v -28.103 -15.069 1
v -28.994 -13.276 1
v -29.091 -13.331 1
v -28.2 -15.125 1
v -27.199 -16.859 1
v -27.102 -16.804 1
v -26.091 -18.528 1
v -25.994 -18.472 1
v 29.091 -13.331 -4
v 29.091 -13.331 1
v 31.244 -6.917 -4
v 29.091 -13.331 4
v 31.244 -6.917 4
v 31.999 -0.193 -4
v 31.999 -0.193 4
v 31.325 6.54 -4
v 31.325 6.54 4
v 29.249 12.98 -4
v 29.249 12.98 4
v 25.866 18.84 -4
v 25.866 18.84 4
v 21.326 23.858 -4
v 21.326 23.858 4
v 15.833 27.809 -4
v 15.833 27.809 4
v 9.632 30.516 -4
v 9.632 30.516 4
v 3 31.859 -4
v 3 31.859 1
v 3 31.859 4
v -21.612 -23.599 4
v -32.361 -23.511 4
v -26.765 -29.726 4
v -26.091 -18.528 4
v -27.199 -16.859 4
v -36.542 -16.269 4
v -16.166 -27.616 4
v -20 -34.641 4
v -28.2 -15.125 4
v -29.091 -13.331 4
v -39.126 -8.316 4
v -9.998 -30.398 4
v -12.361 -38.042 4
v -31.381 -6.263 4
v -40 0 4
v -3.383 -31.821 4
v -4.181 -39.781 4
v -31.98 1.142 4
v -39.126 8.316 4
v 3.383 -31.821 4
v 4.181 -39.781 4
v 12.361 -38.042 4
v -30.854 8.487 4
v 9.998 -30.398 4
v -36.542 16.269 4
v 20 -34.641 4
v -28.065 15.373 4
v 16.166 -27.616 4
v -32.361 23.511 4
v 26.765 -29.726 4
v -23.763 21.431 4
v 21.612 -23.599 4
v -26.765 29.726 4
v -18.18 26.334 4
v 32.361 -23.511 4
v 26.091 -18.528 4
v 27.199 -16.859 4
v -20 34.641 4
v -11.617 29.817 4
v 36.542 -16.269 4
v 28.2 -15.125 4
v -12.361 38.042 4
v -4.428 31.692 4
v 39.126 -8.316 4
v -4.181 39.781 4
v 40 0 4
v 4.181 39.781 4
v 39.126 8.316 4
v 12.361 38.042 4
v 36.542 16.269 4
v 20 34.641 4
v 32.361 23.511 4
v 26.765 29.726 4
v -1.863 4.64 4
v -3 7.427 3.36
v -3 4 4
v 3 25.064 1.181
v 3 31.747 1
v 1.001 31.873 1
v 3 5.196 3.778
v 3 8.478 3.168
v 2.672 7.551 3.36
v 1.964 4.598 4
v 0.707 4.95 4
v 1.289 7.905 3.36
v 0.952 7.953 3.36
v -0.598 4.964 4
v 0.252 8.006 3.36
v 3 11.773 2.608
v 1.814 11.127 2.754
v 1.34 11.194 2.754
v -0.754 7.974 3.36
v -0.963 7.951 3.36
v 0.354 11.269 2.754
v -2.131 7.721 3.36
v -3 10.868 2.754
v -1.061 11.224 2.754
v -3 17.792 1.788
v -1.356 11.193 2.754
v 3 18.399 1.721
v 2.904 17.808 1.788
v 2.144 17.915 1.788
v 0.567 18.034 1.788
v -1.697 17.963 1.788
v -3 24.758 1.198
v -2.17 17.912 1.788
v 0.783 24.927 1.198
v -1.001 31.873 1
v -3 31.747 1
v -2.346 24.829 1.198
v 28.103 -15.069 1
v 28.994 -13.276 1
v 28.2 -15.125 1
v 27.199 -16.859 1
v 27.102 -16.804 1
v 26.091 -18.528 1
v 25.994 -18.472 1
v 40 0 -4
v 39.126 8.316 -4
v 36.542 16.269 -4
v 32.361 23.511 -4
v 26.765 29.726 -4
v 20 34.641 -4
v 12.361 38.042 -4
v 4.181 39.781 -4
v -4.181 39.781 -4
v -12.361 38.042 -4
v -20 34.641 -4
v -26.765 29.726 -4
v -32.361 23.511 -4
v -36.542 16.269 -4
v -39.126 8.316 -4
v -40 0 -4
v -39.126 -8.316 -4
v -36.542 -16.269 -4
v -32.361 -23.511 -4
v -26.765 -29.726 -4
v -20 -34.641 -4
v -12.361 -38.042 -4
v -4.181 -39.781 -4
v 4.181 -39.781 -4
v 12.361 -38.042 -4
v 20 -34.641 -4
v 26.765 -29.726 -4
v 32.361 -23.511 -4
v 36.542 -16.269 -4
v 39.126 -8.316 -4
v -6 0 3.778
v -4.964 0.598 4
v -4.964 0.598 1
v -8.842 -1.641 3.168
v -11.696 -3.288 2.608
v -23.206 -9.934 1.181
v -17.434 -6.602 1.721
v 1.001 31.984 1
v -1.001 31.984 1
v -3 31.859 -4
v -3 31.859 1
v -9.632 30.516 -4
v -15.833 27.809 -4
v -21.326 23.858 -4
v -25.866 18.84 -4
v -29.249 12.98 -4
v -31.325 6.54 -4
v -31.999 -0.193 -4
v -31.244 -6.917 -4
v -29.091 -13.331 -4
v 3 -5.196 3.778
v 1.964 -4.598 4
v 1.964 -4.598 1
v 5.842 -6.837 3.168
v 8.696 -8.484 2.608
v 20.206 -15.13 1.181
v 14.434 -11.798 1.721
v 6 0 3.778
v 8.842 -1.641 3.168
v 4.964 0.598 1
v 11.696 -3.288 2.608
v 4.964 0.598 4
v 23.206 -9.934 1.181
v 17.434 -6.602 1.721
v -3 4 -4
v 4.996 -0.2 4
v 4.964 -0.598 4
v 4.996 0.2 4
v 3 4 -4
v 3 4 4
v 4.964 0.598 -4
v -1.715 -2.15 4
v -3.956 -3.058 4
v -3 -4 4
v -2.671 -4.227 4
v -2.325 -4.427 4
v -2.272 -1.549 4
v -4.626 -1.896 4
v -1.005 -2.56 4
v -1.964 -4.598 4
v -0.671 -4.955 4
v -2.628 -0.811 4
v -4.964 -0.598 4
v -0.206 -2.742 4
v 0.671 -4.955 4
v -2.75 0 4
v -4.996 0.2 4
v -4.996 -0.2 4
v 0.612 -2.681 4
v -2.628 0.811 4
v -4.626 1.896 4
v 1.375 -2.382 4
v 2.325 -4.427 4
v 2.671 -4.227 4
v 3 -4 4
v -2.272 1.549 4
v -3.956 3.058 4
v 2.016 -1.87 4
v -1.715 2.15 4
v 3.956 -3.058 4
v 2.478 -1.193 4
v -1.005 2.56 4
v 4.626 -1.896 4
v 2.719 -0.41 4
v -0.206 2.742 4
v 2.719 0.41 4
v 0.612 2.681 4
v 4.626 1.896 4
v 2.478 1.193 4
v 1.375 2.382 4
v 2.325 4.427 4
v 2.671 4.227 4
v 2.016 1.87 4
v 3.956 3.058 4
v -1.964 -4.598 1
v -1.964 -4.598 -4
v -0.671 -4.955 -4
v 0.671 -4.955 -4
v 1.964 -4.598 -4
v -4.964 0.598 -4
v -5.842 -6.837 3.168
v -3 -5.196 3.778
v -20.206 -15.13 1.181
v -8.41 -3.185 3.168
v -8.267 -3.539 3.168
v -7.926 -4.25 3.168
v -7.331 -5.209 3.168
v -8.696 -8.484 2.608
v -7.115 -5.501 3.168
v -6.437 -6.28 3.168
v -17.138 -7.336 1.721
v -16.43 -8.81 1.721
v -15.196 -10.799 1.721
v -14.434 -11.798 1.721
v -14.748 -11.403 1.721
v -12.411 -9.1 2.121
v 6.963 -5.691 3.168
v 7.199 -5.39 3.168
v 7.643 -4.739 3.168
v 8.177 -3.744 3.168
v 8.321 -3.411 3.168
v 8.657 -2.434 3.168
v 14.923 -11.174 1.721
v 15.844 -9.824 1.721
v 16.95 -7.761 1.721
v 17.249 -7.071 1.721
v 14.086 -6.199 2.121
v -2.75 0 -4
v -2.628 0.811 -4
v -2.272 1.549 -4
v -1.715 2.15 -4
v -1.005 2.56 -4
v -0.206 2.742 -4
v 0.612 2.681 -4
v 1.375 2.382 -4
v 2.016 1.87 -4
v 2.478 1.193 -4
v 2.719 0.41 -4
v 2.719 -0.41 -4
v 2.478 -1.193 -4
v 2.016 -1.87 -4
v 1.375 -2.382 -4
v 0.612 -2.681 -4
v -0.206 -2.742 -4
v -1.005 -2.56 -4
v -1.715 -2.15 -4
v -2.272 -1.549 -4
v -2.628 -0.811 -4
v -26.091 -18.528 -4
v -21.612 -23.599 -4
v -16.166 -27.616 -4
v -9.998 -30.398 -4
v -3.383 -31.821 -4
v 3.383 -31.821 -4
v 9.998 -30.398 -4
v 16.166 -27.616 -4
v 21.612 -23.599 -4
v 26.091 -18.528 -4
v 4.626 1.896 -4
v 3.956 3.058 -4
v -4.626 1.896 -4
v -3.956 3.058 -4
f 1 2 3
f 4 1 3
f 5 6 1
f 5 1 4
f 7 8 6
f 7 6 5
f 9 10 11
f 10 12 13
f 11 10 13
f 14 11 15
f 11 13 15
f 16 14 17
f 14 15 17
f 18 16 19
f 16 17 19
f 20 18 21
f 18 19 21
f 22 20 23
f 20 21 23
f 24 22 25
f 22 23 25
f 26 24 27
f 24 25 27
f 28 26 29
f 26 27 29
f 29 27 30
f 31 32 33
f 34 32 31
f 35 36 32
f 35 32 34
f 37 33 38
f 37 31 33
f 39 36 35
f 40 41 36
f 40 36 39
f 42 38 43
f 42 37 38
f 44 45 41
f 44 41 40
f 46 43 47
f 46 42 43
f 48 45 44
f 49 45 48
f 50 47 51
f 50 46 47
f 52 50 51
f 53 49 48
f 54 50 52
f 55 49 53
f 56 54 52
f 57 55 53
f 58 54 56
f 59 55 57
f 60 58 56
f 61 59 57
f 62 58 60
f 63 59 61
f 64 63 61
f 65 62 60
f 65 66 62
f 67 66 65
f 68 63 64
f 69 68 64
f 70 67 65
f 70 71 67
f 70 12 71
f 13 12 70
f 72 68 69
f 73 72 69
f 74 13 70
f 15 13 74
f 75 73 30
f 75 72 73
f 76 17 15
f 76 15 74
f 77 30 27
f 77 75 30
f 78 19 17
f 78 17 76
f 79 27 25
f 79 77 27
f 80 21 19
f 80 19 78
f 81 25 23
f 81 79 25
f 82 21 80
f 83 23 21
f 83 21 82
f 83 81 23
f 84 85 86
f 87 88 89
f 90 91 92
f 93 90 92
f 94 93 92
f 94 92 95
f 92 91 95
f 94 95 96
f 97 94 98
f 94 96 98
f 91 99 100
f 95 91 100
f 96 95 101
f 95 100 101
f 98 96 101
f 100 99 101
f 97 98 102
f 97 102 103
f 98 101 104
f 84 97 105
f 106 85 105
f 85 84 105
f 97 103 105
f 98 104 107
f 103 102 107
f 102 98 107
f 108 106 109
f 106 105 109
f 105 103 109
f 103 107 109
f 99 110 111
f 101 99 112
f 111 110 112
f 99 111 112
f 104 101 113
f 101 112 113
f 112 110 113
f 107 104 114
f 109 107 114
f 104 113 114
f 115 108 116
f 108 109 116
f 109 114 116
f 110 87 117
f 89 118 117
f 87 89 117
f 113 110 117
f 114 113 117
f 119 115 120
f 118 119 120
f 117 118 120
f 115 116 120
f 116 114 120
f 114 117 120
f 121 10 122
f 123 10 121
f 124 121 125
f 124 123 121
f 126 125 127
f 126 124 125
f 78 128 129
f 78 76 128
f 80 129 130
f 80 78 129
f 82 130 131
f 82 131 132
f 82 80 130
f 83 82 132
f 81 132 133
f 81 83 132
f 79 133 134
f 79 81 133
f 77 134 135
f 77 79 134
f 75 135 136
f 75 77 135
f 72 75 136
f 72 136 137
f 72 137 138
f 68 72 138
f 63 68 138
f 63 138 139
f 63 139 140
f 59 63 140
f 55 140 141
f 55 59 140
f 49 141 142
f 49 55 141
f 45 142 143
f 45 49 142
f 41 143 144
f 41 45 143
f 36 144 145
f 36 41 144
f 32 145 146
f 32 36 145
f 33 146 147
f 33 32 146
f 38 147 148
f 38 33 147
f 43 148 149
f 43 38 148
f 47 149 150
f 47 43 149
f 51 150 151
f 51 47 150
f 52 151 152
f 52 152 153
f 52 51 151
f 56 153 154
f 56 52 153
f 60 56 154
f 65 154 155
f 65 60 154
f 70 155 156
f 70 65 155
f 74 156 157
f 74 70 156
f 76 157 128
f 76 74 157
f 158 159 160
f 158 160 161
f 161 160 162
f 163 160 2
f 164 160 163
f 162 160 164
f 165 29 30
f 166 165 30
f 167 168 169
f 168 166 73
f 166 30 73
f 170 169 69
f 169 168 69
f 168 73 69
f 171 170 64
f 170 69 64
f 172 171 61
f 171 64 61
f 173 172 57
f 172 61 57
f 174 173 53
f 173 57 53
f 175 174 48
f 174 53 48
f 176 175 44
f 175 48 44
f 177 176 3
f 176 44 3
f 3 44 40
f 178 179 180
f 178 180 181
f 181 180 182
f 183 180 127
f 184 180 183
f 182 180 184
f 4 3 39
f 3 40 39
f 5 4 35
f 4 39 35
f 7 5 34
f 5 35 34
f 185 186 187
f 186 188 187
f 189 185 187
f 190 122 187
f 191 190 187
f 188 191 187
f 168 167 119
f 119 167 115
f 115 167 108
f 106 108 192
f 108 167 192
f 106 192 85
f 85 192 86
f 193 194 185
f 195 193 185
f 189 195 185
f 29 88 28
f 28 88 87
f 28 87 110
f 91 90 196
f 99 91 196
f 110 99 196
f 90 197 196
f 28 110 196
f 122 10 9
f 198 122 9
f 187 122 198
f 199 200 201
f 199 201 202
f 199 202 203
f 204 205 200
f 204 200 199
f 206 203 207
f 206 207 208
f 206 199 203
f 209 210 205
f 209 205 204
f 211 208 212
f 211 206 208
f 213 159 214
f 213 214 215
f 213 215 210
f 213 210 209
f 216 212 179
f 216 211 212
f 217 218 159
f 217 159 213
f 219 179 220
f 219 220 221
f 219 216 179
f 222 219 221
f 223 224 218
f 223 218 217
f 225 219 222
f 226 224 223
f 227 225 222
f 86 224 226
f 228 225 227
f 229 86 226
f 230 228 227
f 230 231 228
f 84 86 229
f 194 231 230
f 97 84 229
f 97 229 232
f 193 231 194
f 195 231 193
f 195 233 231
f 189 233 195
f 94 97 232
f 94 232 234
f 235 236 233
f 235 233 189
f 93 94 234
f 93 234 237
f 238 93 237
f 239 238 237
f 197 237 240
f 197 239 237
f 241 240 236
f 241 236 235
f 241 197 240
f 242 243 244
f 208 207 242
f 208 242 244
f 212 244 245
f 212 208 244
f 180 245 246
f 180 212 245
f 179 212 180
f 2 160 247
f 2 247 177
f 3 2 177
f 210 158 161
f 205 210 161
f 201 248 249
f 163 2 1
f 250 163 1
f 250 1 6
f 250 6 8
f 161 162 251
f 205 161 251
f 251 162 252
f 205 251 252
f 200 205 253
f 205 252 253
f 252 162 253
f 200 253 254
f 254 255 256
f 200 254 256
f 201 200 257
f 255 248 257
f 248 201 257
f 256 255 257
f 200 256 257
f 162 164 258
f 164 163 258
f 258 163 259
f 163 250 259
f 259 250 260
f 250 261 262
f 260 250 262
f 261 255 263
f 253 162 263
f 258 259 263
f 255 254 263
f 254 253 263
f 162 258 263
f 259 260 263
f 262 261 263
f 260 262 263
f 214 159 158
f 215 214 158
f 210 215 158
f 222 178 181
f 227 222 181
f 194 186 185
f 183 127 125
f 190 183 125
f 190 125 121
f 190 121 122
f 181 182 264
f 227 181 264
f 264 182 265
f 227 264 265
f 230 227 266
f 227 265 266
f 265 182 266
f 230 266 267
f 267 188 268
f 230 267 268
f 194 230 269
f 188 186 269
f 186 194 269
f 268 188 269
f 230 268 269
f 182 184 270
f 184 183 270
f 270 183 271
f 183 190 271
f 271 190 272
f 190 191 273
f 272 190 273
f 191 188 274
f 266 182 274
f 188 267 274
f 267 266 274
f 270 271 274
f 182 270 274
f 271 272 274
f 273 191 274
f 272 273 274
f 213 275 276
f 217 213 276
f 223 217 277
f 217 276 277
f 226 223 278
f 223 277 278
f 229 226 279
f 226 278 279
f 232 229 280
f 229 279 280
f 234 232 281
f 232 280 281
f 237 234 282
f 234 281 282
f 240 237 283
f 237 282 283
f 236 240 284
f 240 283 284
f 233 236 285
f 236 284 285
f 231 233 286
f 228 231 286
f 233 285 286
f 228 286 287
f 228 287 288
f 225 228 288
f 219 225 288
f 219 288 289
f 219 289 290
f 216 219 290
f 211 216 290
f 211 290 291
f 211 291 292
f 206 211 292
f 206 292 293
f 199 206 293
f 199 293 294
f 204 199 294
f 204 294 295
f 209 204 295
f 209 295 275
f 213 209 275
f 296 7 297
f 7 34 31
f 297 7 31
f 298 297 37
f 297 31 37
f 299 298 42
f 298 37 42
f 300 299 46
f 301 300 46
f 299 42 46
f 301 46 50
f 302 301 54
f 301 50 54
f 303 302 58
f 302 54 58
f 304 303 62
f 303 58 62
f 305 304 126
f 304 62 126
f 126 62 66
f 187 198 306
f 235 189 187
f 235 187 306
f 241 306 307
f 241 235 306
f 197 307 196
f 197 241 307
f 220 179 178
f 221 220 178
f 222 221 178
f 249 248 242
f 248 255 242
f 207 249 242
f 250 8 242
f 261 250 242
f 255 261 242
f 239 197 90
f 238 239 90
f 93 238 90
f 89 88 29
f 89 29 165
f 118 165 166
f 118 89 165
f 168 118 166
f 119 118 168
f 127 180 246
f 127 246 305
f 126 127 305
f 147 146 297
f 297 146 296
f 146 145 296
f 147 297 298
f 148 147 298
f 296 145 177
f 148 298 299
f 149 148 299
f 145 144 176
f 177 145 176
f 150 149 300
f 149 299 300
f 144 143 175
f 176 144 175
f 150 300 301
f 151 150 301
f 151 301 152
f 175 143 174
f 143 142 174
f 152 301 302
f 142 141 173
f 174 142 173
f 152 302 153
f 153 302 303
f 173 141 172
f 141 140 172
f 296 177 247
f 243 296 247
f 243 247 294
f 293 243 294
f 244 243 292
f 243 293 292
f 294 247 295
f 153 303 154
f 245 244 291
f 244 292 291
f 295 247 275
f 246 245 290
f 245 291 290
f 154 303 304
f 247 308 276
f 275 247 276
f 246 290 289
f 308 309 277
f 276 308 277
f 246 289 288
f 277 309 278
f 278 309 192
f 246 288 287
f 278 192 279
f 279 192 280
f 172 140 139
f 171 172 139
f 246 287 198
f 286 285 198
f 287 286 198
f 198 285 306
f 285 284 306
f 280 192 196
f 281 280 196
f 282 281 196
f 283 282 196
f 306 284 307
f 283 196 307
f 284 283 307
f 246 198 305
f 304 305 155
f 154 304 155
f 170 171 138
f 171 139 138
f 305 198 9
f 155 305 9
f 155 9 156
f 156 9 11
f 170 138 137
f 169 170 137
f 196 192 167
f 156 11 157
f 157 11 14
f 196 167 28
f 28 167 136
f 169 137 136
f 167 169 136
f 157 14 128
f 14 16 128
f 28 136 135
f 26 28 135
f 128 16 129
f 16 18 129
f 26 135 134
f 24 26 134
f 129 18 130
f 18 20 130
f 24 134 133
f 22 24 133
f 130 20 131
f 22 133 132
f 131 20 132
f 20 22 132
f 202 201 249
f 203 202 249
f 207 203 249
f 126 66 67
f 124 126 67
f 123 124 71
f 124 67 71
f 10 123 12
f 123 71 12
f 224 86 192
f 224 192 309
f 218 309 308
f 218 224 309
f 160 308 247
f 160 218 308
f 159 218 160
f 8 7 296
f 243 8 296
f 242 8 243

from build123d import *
from build123d.topology import SkipClean

# Parameters (mm, degrees)
SKETCH1_R            = 40
SKETCH1_R_2          = 32
SKETCH1_R_3          = 5
BOSS_EXTRUDE1_DEPTH  = 4
SKETCH3_R            = 32
SKETCH3_R_2          = 5
CUT_EXTRUDE2_DEPTH   = 3
FILLET5_R            = 122
M5_CLEARANCE_HOLE1_D = 5.5


with BuildPart() as part:
    # Sketch1 → Boss-Extrude1 (new, symmetric)
    # profile 1 of 5: a face of its own
    with BuildSketch(Plane.XY):
        Circle(SKETCH1_R)
        Circle(SKETCH1_R_2, mode=Mode.SUBTRACT)
    # profile 2 of 5: a face of its own
    with BuildSketch(Plane.XY):
        with BuildLine():
            Line((-3, 31.859064644), (-3, 4))
            ThreePointArc((-3, 4), (0, 5), (3, 4))
            Line((3, 4), (3, 31.859064644))
            ThreePointArc((3, 31.859064644), (0, 32), (-3, 31.859064644))
        make_face()
    # profile 3 of 5: a face of its own
    with BuildSketch(Plane.XY):
        Circle(SKETCH1_R_3)
    # profile 4 of 5: a face of its own
    with BuildSketch(Plane.XY):
        with BuildLine():
            Line((29.090759323, -13.331456111), (4.964101615, 0.598076211))
            ThreePointArc((4.964101615, 0.598076211), (4.991017335, 0.299576304), (5, 0))
            ThreePointArc((5, 0), (4.172559651, -2.754949357), (1.964101615, -4.598076211))
            Line((1.964101615, -4.598076211), (26.090759323, -18.527608533))
            ThreePointArc((26.090759323, -18.527608533), (27.712812921, -16), (29.090759323, -13.331456111))
        make_face()
    # profile 5 of 5: a face of its own
    with BuildSketch(Plane.XY):
        with BuildLine():
            ThreePointArc((-1.964101615, -4.598076211), (-4.330127019, -2.5), (-4.964101615, 0.598076211))
            Line((-4.964101615, 0.598076211), (-29.090759323, -13.331456111))
            ThreePointArc((-29.090759323, -13.331456111), (-27.712812921, -16), (-26.090759323, -18.527608533))
            Line((-26.090759323, -18.527608533), (-1.964101615, -4.598076211))
        make_face()
    extrude(amount=BOSS_EXTRUDE1_DEPTH, both=True)

    # Sketch3 → Cut-Extrude2 (cut)
    with SkipClean():  # the faces are left unmerged after this step: merging them gives an invalid solid
        with BuildSketch(Plane.XY.offset(4)):
            with Locations(Location((0, 0, 0), (0, 0, 204.620621009))):
                Circle(SKETCH3_R)
            with Locations(Location((0, 0, 0), (0, 0, 173.130102354))):
                Circle(SKETCH3_R_2, mode=Mode.SUBTRACT)
        extrude(amount=-CUT_EXTRUDE2_DEPTH, mode=Mode.SUBTRACT)

    # Fillet5
    # the kernel refuses this fillet: 122 mm, written as the material it adds along each edge
    with BuildSketch(Plane(origin=(0, 0, 1), x_dir=(0.8644503363816339, 0.5027182271707281, 0), z_dir=(0.5027182271707281, -0.8644503363816339, 0))) as fillet5_piece_1_section:
        with BuildLine():
            CenterArc((31.888659319, 122), FILLET5_R, 257.267539737, 12.732460263)
            Line((31.888659319, 0), (5, 0))
            Line((5, 0), (5, 3))
        make_face()
    fillet5_piece_1 = revolve(axis=Axis((0, 0, 1), (0, 0, 1)), revolution_arc=359.64, mode=Mode.PRIVATE)
    fillet5_piece_1 = split(fillet5_piece_1, bisect_by=Plane(origin=(3, 0, 1), z_dir=(-1, 0, 0)), keep=Keep.TOP, mode=Mode.PRIVATE)
    fillet5_piece_1 = split(fillet5_piece_1, bisect_by=Plane(origin=(-1.5, 2.598076211, 1), z_dir=(0.5000000000000004, -0.8660254037844384, 0)), keep=Keep.TOP, mode=Mode.PRIVATE)
    fillet5_piece_1 = split(fillet5_piece_1, bisect_by=Plane(origin=(-1.5, -2.598076211, 1), z_dir=(0.49999999999999983, 0.8660254037844387, 0)), keep=Keep.TOP, mode=Mode.PRIVATE)
    add(fillet5_piece_1)
    with BuildSketch(Plane(origin=(0, 0, 1), x_dir=(0.8644503363816339, 0.5027182271707281, 0), z_dir=(0.5027182271707281, -0.8644503363816339, 0))) as fillet5_piece_2_section:
        with BuildLine():
            CenterArc((31.888659319, 122), FILLET5_R, 257.267539737, 12.732460263)
            Line((31.888659319, 0), (5, 0))
            Line((5, 0), (5, 3))
        make_face()
    fillet5_piece_2 = revolve(axis=Axis((0, 0, 1), (0, 0, 1)), revolution_arc=359.64, mode=Mode.PRIVATE)
    fillet5_piece_2 = split(fillet5_piece_2, bisect_by=Plane(origin=(3, 0, 1), z_dir=(-1, 0, 0)), keep=Keep.TOP, mode=Mode.PRIVATE)
    fillet5_piece_2 = split(fillet5_piece_2, bisect_by=Plane(origin=(-3, 0, 1), z_dir=(1, 0, 0)), keep=Keep.TOP, mode=Mode.PRIVATE)
    fillet5_piece_2 = split(fillet5_piece_2, bisect_by=Plane(origin=(1.5, -2.598076211, 1), z_dir=(-0.5000000000000003, 0.8660254037844385, 0)), keep=Keep.TOP, mode=Mode.PRIVATE)
    add(fillet5_piece_2)
    with BuildSketch(Plane(origin=(0, 0, 1), x_dir=(0.8644503363816339, 0.5027182271707281, 0), z_dir=(0.5027182271707281, -0.8644503363816339, 0))) as fillet5_piece_3_section:
        with BuildLine():
            CenterArc((31.888659319, 122), FILLET5_R, 257.267539737, 12.732460263)
            Line((31.888659319, 0), (5, 0))
            Line((5, 0), (5, 3))
        make_face()
    fillet5_piece_3 = revolve(axis=Axis((0, 0, 1), (0, 0, 1)), revolution_arc=359.64, mode=Mode.PRIVATE)
    fillet5_piece_3 = split(fillet5_piece_3, bisect_by=Plane(origin=(1.5, 2.598076211, 1), z_dir=(-0.49999999999999983, -0.8660254037844387, 0)), keep=Keep.TOP, mode=Mode.PRIVATE)
    fillet5_piece_3 = split(fillet5_piece_3, bisect_by=Plane(origin=(-1.5, 2.598076211, 1), z_dir=(0.5000000000000004, -0.8660254037844384, 0)), keep=Keep.TOP, mode=Mode.PRIVATE)
    fillet5_piece_3 = split(fillet5_piece_3, bisect_by=Plane(origin=(1.5, -2.598076211, 1), z_dir=(-0.5000000000000003, 0.8660254037844385, 0)), keep=Keep.TOP, mode=Mode.PRIVATE)
    add(fillet5_piece_3)
    with BuildSketch(Plane(origin=(0, 0, 1), x_dir=(0.8644503363816339, 0.5027182271707281, 0), z_dir=(0.5027182271707281, -0.8644503363816339, 0))) as fillet5_piece_4_section:
        with BuildLine():
            CenterArc((31.888659319, 122), FILLET5_R, 257.267539737, 12.732460263)
            Line((31.888659319, 0), (5, 0))
            Line((5, 0), (5, 3))
        make_face()
    fillet5_piece_4 = revolve(axis=Axis((0, 0, 1), (0, 0, 1)), revolution_arc=359.64, mode=Mode.PRIVATE)
    fillet5_piece_4 = split(fillet5_piece_4, bisect_by=Plane(origin=(1.5, 2.598076211, 1), z_dir=(-0.49999999999999983, -0.8660254037844387, 0)), keep=Keep.TOP, mode=Mode.PRIVATE)
    fillet5_piece_4 = split(fillet5_piece_4, bisect_by=Plane(origin=(1.5, -2.598076211, 1), z_dir=(0.5000000000000003, -0.8660254037844385, 0)), keep=Keep.TOP, mode=Mode.PRIVATE)
    fillet5_piece_4 = split(fillet5_piece_4, bisect_by=Plane(origin=(-1.5, -2.598076211, 1), z_dir=(0.49999999999999983, 0.8660254037844387, 0)), keep=Keep.TOP, mode=Mode.PRIVATE)
    add(fillet5_piece_4)
    with BuildSketch(Plane(origin=(0, 0, 1), x_dir=(-0.8675919238668259, 0.4972768380299447, 0), z_dir=(0.4972768380299447, 0.8675919238668259, 0))) as fillet5_piece_5_section:
        with BuildLine():
            CenterArc((31.888659319, 122), FILLET5_R, 257.267539737, 12.732460263)
            Line((31.888659319, 0), (5, 0))
            Line((5, 0), (5, 3))
        make_face()
    fillet5_piece_5 = revolve(axis=Axis((0, 0, 1), (0, 0, 1)), revolution_arc=359.64, mode=Mode.PRIVATE)
    fillet5_piece_5 = split(fillet5_piece_5, bisect_by=Plane(origin=(1.5, 2.598076211, 1), z_dir=(-0.49999999999999983, -0.8660254037844387, 0)), keep=Keep.TOP, mode=Mode.PRIVATE)
    fillet5_piece_5 = split(fillet5_piece_5, bisect_by=Plane(origin=(-1.5, 2.598076211, 1), z_dir=(0.5000000000000004, -0.8660254037844384, 0)), keep=Keep.TOP, mode=Mode.PRIVATE)
    fillet5_piece_5 = split(fillet5_piece_5, bisect_by=Plane(origin=(-1.5, -2.598076211, 1), z_dir=(0.49999999999999983, 0.8660254037844387, 0)), keep=Keep.TOP, mode=Mode.PRIVATE)
    add(fillet5_piece_5)
    with BuildSketch(Plane(origin=(0, 0, 1), x_dir=(-0.8675919238668259, 0.4972768380299447, 0), z_dir=(0.4972768380299447, 0.8675919238668259, 0))) as fillet5_piece_6_section:
        with BuildLine():
            CenterArc((31.888659319, 122), FILLET5_R, 257.267539737, 12.732460263)
            Line((31.888659319, 0), (5, 0))
            Line((5, 0), (5, 3))
        make_face()
    fillet5_piece_6 = revolve(axis=Axis((0, 0, 1), (0, 0, 1)), revolution_arc=359.64, mode=Mode.PRIVATE)
    fillet5_piece_6 = split(fillet5_piece_6, bisect_by=Plane(origin=(3, 0, 1), z_dir=(-1, 0, 0)), keep=Keep.TOP, mode=Mode.PRIVATE)
    fillet5_piece_6 = split(fillet5_piece_6, bisect_by=Plane(origin=(-1.5, 2.598076211, 1), z_dir=(0.5000000000000004, -0.8660254037844384, 0)), keep=Keep.TOP, mode=Mode.PRIVATE)
    fillet5_piece_6 = split(fillet5_piece_6, bisect_by=Plane(origin=(1.5, -2.598076211, 1), z_dir=(-0.5000000000000003, 0.8660254037844385, 0)), keep=Keep.TOP, mode=Mode.PRIVATE)
    add(fillet5_piece_6)
    with BuildSketch(Plane(origin=(0, 0, 1), x_dir=(-0.8675919238668259, 0.4972768380299447, 0), z_dir=(0.4972768380299447, 0.8675919238668259, 0))) as fillet5_piece_7_section:
        with BuildLine():
            CenterArc((31.888659319, 122), FILLET5_R, 257.267539737, 12.732460263)
            Line((31.888659319, 0), (5, 0))
            Line((5, 0), (5, 3))
        make_face()
    fillet5_piece_7 = revolve(axis=Axis((0, 0, 1), (0, 0, 1)), revolution_arc=359.64, mode=Mode.PRIVATE)
    fillet5_piece_7 = split(fillet5_piece_7, bisect_by=Plane(origin=(3, 0, 1), z_dir=(-1, 0, 0)), keep=Keep.TOP, mode=Mode.PRIVATE)
    fillet5_piece_7 = split(fillet5_piece_7, bisect_by=Plane(origin=(-3, 0, 1), z_dir=(1, 0, 0)), keep=Keep.TOP, mode=Mode.PRIVATE)
    fillet5_piece_7 = split(fillet5_piece_7, bisect_by=Plane(origin=(-1.5, -2.598076211, 1), z_dir=(0.49999999999999983, 0.8660254037844387, 0)), keep=Keep.TOP, mode=Mode.PRIVATE)
    add(fillet5_piece_7)
    with BuildSketch(Plane(origin=(0, 0, 1), x_dir=(0.0031415874858787157, -0.9999950652018581, 0), z_dir=(-0.9999950652018581, -0.0031415874858787157, 0))) as fillet5_piece_8_section:
        with BuildLine():
            CenterArc((31.888659319, 122), FILLET5_R, 257.267539737, 12.732460263)
            Line((31.888659319, 0), (5, 0))
            Line((5, 0), (5, 3))
        make_face()
    fillet5_piece_8 = revolve(axis=Axis((0, 0, 1), (0, 0, 1)), revolution_arc=359.64, mode=Mode.PRIVATE)
    fillet5_piece_8 = split(fillet5_piece_8, bisect_by=Plane(origin=(1.5, 2.598076211, 1), z_dir=(-0.49999999999999983, -0.8660254037844387, 0)), keep=Keep.TOP, mode=Mode.PRIVATE)
    fillet5_piece_8 = split(fillet5_piece_8, bisect_by=Plane(origin=(-1.5, 2.598076211, 1), z_dir=(0.5000000000000004, -0.8660254037844384, 0)), keep=Keep.TOP, mode=Mode.PRIVATE)
    fillet5_piece_8 = split(fillet5_piece_8, bisect_by=Plane(origin=(-1.5, -2.598076211, 1), z_dir=(0.49999999999999983, 0.8660254037844387, 0)), keep=Keep.TOP, mode=Mode.PRIVATE)
    add(fillet5_piece_8)
    with BuildSketch(Plane(origin=(0, 0, 1), x_dir=(0.0031415874858787157, -0.9999950652018581, 0), z_dir=(-0.9999950652018581, -0.0031415874858787157, 0))) as fillet5_piece_9_section:
        with BuildLine():
            CenterArc((31.888659319, 122), FILLET5_R, 257.267539737, 12.732460263)
            Line((31.888659319, 0), (5, 0))
            Line((5, 0), (5, 3))
        make_face()
    fillet5_piece_9 = revolve(axis=Axis((0, 0, 1), (0, 0, 1)), revolution_arc=359.64, mode=Mode.PRIVATE)
    fillet5_piece_9 = split(fillet5_piece_9, bisect_by=Plane(origin=(3, 0, 1), z_dir=(-1, 0, 0)), keep=Keep.TOP, mode=Mode.PRIVATE)
    fillet5_piece_9 = split(fillet5_piece_9, bisect_by=Plane(origin=(-3, 0, 1), z_dir=(1, 0, 0)), keep=Keep.TOP, mode=Mode.PRIVATE)
    fillet5_piece_9 = split(fillet5_piece_9, bisect_by=Plane(origin=(1.5, -2.598076211, 1), z_dir=(-0.5000000000000003, 0.8660254037844385, 0)), keep=Keep.TOP, mode=Mode.PRIVATE)
    add(fillet5_piece_9)
    with BuildSketch(Plane(origin=(0, 0, 1), x_dir=(0.0031415874858787157, -0.9999950652018581, 0), z_dir=(-0.9999950652018581, -0.0031415874858787157, 0))) as fillet5_piece_10_section:
        with BuildLine():
            CenterArc((31.888659319, 122), FILLET5_R, 257.267539737, 12.732460263)
            Line((31.888659319, 0), (5, 0))
            Line((5, 0), (5, 3))
        make_face()
    fillet5_piece_10 = revolve(axis=Axis((0, 0, 1), (0, 0, 1)), revolution_arc=359.64, mode=Mode.PRIVATE)
    fillet5_piece_10 = split(fillet5_piece_10, bisect_by=Plane(origin=(-1.5, 2.598076211, 1), z_dir=(0.5000000000000004, -0.8660254037844384, 0)), keep=Keep.TOP, mode=Mode.PRIVATE)
    fillet5_piece_10 = split(fillet5_piece_10, bisect_by=Plane(origin=(1.5, -2.598076211, 1), z_dir=(-0.5000000000000003, 0.8660254037844385, 0)), keep=Keep.TOP, mode=Mode.PRIVATE)
    fillet5_piece_10 = split(fillet5_piece_10, bisect_by=Plane(origin=(-1.5, -2.598076211, 1), z_dir=(-0.49999999999999983, -0.8660254037844387, 0)), keep=Keep.TOP, mode=Mode.PRIVATE)
    add(fillet5_piece_10)

    # M5 Clearance Hole1 (through all)
    with Locations(Plane.XY.offset(4)):
        with Locations((0, 0)):
            Hole(M5_CLEARANCE_HOLE1_D / 2)


solid = part.part
